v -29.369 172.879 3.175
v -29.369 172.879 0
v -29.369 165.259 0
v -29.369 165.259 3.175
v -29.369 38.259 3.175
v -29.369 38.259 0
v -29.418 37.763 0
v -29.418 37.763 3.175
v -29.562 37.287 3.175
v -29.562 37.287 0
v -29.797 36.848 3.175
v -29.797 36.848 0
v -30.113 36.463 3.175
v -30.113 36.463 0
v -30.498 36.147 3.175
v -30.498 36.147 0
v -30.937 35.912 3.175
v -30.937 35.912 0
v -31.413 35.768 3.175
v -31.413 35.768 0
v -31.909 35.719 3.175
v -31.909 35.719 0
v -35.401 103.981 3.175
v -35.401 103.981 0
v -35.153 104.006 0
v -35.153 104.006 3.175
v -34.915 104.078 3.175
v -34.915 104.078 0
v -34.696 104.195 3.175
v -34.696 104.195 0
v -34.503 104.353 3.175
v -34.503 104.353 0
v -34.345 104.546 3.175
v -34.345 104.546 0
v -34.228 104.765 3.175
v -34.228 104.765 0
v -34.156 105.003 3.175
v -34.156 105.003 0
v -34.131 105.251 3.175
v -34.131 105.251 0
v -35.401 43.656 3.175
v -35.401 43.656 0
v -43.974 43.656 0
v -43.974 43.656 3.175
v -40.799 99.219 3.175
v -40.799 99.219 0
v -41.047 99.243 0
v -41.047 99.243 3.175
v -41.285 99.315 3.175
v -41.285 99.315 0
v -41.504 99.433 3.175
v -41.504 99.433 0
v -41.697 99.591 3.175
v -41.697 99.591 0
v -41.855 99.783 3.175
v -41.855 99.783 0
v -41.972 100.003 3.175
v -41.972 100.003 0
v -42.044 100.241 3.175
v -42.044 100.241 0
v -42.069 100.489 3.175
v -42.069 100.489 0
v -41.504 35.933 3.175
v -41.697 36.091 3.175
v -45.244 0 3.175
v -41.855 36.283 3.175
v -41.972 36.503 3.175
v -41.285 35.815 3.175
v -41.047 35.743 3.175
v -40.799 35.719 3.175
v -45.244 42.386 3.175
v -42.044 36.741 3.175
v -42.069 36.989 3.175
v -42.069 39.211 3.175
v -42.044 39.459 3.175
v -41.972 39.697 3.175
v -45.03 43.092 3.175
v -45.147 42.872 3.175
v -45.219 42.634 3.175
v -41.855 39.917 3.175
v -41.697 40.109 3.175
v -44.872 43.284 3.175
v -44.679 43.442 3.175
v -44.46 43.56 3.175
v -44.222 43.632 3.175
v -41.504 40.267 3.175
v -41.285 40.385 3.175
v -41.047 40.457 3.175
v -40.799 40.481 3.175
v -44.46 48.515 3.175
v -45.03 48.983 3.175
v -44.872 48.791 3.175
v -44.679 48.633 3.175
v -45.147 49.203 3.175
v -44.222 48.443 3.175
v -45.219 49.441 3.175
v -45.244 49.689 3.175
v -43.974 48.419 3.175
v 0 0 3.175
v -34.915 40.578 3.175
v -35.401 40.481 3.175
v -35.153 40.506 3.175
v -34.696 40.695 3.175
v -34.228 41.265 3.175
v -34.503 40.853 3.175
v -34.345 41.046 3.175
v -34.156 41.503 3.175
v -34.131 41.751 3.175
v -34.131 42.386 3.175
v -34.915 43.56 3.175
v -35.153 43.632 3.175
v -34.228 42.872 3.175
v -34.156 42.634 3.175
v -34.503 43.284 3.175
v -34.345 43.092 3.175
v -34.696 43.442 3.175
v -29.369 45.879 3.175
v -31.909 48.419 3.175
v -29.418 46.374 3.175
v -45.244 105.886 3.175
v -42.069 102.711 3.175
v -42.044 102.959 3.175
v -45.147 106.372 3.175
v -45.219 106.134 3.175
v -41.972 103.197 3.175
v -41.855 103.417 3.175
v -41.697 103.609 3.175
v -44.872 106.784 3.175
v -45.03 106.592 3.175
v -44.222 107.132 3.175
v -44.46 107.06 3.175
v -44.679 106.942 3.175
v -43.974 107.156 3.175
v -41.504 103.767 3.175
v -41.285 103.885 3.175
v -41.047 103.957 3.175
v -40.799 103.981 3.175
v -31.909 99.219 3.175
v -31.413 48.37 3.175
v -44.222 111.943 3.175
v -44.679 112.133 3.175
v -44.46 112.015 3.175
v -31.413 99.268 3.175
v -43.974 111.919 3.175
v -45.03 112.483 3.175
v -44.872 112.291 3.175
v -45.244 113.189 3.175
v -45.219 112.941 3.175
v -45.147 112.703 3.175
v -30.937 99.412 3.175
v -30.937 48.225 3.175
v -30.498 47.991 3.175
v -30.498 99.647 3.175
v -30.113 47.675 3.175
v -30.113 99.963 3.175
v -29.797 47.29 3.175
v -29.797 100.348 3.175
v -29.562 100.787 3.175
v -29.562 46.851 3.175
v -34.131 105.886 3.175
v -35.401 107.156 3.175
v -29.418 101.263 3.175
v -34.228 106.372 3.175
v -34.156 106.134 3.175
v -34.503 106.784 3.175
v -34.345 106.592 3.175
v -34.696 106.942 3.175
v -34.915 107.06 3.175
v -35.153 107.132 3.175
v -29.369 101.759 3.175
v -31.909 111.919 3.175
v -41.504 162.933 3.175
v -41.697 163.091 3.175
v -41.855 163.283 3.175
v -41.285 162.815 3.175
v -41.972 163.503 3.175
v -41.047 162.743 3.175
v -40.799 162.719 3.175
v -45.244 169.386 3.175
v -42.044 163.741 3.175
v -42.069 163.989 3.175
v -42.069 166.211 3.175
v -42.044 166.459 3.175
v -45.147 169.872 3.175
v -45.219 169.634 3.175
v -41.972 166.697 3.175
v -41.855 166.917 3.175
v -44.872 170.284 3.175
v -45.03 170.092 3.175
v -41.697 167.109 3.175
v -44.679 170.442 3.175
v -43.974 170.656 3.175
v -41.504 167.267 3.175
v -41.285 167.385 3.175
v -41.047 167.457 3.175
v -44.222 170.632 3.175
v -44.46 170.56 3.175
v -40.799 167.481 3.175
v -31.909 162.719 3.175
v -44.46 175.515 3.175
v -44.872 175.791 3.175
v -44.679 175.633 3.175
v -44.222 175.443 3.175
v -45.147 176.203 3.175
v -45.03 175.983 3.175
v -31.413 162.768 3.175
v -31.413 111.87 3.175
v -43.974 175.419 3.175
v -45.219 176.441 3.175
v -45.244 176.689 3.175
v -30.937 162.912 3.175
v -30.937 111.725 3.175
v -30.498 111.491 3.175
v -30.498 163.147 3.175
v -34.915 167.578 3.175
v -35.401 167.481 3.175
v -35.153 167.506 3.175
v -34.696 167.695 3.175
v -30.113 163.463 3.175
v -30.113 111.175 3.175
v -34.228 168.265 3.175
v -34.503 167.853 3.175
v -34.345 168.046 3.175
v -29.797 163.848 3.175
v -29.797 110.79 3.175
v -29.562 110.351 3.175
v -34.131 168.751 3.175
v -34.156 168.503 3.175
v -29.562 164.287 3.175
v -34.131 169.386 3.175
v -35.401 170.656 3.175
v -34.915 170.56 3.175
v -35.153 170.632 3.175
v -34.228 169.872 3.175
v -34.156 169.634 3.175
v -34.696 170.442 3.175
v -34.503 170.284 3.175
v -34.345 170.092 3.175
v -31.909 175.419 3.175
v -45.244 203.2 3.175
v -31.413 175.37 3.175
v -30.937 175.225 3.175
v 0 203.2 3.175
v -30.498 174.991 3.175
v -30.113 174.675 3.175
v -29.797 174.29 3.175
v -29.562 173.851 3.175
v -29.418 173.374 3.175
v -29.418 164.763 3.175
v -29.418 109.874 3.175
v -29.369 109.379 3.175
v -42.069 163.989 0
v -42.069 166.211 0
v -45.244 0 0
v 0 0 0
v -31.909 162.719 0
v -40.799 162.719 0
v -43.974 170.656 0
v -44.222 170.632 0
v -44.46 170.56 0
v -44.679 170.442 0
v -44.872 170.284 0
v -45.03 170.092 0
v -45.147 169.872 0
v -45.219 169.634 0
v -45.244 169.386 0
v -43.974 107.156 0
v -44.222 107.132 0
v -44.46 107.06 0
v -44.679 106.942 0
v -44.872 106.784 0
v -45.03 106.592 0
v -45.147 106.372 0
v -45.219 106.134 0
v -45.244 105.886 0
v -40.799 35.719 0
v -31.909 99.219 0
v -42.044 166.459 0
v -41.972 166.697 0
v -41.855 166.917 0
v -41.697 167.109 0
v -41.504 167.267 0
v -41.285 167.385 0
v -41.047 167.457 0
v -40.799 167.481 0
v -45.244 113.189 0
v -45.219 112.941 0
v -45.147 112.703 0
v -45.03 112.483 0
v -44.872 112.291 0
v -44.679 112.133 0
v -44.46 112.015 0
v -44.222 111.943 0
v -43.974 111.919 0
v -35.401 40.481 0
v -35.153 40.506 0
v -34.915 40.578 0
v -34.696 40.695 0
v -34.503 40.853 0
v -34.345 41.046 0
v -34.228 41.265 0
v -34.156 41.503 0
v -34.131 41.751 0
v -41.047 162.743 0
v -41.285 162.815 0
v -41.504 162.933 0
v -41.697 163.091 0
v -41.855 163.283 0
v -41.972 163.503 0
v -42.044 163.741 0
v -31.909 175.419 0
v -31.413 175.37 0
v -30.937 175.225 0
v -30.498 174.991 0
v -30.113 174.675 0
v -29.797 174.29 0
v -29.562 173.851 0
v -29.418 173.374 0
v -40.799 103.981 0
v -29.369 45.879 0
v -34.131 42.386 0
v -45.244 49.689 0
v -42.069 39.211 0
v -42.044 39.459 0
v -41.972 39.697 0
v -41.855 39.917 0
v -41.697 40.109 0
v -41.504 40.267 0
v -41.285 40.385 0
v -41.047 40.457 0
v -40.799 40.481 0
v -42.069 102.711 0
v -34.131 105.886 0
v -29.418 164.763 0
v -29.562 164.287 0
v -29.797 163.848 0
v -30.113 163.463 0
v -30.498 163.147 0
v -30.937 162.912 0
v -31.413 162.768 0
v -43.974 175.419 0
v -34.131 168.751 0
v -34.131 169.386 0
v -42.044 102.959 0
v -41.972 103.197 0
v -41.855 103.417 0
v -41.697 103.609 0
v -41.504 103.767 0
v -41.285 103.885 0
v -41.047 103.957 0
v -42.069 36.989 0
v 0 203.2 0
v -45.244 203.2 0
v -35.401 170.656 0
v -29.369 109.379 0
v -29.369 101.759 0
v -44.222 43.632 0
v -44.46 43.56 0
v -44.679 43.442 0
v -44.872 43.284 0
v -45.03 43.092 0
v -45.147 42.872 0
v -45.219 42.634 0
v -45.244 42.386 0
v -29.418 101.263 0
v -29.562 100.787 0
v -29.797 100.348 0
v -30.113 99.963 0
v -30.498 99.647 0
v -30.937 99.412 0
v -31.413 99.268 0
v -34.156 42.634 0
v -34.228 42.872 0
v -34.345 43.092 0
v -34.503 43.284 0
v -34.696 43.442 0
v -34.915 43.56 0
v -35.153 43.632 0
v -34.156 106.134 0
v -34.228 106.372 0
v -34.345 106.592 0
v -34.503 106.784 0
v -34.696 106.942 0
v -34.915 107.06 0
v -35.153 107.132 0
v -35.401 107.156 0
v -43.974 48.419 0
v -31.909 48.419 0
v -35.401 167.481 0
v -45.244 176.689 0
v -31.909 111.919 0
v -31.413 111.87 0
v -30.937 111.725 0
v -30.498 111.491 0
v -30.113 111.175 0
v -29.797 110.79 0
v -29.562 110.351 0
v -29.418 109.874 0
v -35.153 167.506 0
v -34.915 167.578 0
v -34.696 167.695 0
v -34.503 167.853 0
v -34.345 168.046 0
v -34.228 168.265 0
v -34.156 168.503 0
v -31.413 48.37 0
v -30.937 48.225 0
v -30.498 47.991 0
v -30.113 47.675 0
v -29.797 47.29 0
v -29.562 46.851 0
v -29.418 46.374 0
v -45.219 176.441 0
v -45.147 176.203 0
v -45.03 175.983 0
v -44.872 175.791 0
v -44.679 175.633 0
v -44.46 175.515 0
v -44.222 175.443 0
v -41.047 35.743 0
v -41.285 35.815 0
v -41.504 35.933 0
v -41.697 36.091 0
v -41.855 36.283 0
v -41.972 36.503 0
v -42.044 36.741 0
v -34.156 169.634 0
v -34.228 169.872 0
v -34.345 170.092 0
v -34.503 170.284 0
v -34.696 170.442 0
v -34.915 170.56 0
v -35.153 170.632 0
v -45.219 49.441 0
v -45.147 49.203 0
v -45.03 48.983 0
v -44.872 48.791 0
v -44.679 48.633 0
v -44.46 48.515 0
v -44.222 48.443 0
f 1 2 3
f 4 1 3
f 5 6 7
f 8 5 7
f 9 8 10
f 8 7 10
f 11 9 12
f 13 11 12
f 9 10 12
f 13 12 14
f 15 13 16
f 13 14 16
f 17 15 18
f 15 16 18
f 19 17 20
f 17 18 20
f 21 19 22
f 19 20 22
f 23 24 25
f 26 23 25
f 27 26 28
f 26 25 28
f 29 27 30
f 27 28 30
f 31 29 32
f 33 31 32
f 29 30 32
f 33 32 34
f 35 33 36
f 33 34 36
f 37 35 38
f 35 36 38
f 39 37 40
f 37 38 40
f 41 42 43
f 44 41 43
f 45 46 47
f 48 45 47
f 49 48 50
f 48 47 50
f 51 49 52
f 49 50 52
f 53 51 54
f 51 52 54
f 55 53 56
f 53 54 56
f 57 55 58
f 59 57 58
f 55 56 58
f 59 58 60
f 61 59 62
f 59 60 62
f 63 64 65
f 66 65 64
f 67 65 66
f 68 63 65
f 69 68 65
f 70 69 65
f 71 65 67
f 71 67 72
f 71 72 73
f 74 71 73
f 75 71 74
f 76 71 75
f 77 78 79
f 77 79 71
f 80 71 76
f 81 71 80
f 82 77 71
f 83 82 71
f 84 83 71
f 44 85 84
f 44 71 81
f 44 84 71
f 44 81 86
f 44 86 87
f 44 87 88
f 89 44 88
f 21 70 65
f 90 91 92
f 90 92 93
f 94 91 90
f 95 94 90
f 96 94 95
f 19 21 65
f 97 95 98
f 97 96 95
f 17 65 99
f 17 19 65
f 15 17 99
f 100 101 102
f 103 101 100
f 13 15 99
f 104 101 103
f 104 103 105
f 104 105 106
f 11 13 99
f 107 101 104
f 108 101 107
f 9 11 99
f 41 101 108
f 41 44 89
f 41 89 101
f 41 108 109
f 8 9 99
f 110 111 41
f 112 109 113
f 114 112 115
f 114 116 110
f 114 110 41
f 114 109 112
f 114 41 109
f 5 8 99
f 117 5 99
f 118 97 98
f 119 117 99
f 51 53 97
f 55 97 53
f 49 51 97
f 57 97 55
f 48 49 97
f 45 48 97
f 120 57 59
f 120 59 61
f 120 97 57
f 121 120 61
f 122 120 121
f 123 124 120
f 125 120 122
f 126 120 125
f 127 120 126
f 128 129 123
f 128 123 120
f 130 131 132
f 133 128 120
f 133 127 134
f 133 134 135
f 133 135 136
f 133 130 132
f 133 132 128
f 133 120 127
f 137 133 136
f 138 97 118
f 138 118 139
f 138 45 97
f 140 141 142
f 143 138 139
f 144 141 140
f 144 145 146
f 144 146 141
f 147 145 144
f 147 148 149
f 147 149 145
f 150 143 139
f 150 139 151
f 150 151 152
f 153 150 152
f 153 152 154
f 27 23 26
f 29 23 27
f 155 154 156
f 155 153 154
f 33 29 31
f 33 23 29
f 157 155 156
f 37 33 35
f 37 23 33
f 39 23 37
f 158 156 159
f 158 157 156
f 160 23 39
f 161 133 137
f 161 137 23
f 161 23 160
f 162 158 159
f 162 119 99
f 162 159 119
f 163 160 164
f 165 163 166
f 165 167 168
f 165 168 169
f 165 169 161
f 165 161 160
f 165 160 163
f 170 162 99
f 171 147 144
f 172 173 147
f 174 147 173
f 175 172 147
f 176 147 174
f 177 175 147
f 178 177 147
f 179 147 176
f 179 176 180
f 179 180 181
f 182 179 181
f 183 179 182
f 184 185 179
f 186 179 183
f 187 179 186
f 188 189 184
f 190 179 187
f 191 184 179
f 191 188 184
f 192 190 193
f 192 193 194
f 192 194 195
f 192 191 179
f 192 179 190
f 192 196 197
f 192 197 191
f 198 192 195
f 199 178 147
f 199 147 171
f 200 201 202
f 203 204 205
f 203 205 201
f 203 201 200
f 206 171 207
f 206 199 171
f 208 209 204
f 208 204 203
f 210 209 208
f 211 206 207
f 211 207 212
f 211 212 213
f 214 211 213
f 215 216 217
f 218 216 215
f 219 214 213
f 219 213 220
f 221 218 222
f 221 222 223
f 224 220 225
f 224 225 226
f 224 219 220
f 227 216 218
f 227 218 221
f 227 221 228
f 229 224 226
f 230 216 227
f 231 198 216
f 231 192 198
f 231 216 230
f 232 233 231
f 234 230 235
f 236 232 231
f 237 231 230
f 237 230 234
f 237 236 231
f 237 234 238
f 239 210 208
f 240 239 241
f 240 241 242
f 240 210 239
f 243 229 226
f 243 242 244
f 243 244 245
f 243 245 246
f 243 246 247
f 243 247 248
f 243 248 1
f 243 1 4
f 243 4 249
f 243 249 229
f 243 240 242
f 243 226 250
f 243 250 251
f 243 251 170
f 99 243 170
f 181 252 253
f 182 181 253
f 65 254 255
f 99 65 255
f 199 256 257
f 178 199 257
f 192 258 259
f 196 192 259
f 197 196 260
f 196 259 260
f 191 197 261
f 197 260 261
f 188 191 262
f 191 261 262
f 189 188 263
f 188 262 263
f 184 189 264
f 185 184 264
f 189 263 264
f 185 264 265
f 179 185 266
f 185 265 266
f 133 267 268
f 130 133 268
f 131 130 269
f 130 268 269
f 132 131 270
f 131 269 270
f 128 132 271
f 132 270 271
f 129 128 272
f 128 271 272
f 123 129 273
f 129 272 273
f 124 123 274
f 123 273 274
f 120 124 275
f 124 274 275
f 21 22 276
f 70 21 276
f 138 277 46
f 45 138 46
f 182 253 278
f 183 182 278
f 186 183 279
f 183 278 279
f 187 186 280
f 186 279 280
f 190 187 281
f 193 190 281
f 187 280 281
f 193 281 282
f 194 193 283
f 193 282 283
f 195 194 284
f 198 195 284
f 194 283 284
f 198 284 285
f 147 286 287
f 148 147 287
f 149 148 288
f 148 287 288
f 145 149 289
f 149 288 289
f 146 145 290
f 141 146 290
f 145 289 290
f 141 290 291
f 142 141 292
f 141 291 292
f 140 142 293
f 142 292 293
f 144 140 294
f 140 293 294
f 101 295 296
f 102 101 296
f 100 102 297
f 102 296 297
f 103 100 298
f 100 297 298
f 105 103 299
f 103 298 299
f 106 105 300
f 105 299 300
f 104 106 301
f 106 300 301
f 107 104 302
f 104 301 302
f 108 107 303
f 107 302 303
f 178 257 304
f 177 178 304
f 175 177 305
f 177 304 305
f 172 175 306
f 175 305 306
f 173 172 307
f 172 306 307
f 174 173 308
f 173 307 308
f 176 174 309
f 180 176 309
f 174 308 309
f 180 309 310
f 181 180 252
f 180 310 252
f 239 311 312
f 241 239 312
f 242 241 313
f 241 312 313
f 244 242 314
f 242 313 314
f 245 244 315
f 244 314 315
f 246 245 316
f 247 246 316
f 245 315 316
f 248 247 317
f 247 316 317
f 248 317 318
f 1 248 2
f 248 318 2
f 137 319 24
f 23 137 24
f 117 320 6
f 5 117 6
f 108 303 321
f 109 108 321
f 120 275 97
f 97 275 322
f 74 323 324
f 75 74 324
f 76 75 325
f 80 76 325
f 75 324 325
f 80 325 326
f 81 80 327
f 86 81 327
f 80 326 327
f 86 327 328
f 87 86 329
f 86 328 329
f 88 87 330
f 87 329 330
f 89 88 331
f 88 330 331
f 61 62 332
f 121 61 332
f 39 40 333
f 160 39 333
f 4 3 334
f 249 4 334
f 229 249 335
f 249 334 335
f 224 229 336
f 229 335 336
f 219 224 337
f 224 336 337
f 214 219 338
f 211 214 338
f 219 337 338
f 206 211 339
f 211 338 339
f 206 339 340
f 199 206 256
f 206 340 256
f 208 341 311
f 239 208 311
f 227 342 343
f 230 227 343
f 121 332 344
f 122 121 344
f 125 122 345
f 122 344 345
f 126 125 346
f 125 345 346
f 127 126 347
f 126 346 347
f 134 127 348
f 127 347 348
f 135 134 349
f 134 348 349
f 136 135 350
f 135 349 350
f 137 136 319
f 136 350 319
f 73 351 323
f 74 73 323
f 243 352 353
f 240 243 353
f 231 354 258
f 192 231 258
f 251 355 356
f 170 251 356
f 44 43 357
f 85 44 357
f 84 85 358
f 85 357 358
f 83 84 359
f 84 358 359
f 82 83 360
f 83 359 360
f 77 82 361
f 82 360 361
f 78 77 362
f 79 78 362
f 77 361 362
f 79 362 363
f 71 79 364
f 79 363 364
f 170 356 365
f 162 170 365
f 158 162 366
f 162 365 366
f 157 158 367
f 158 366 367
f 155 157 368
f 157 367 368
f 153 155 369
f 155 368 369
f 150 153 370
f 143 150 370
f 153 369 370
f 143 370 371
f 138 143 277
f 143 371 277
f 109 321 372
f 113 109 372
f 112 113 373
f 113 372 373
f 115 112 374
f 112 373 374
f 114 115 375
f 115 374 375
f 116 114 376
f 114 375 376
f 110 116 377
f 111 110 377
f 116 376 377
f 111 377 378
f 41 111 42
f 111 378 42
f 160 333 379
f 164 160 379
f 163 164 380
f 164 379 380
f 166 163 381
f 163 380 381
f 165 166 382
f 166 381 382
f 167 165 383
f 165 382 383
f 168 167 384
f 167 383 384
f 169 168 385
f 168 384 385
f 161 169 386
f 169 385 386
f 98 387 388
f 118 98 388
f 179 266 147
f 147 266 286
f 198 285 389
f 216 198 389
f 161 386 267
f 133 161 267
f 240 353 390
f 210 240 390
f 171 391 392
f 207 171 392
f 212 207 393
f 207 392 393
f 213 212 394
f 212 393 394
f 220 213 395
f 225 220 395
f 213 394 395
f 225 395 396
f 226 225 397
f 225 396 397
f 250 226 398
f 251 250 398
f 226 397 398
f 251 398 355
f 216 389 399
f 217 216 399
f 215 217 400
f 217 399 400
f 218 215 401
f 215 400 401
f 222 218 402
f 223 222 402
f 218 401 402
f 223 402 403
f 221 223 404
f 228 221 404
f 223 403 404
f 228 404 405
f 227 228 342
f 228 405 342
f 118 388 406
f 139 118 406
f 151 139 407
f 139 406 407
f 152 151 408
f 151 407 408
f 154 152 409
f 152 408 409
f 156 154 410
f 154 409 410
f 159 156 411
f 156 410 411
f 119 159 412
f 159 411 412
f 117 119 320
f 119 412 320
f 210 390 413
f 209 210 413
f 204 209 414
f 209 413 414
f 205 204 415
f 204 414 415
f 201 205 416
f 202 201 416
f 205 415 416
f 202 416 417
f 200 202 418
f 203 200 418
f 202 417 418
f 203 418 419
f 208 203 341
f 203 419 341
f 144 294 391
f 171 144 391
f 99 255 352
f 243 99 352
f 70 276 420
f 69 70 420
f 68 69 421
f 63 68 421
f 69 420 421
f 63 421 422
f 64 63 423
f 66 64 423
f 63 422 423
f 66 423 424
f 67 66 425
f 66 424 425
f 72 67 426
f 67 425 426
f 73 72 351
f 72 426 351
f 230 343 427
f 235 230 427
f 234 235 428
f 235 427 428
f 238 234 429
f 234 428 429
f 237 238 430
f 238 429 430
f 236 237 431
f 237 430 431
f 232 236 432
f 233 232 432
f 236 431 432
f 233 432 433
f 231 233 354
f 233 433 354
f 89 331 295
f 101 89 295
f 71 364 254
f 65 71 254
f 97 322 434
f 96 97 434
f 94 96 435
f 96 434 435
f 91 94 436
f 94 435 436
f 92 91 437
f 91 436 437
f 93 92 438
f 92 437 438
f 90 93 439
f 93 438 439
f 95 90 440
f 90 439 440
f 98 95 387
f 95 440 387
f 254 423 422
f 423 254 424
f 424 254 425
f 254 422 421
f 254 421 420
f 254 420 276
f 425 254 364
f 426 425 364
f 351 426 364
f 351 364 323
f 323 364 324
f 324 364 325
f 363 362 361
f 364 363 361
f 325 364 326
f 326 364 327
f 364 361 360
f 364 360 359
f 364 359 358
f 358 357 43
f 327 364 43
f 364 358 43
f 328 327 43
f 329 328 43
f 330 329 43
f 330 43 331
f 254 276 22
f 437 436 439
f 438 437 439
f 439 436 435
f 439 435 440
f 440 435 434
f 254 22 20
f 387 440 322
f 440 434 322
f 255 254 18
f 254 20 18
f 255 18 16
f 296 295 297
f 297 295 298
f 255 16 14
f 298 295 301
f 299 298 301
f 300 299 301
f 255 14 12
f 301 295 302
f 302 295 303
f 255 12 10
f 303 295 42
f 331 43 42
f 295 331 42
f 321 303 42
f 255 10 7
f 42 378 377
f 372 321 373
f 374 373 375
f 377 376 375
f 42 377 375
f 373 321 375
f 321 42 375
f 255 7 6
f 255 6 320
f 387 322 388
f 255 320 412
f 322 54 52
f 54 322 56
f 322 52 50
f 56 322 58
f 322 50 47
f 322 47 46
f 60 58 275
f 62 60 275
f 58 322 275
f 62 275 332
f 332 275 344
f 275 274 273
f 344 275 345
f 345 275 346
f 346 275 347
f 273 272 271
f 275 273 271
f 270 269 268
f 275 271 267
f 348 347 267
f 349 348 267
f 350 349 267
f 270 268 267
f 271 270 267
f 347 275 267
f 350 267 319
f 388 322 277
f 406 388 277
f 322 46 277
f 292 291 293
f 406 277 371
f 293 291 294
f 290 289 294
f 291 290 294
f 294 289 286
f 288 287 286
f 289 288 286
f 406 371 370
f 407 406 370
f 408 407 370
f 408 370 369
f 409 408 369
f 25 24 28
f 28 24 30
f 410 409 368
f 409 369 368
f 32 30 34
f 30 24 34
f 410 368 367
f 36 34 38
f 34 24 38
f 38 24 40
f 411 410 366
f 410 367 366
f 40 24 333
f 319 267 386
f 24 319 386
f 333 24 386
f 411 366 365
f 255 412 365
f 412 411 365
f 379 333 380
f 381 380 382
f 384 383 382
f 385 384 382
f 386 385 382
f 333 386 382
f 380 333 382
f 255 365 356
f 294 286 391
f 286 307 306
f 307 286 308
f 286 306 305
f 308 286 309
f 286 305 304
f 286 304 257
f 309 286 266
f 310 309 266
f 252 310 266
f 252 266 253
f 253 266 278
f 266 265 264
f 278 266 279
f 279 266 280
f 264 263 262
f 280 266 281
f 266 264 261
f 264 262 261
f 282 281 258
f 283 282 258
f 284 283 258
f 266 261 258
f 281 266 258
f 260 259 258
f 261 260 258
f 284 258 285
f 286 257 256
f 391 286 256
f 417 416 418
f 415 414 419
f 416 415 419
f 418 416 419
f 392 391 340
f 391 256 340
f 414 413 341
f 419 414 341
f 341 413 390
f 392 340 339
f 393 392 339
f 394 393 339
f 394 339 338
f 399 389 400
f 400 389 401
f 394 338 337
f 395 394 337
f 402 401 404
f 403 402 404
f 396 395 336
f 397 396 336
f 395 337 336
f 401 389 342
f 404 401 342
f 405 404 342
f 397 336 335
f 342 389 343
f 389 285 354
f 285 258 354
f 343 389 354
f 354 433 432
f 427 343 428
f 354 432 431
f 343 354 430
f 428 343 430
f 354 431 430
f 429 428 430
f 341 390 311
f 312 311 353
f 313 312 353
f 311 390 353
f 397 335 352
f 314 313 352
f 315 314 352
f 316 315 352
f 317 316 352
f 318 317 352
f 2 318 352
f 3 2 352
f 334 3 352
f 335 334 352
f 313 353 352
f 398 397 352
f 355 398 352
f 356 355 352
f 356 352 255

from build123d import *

# Parameters (mm, degrees)
F1_DEPTH = 3.175


# Not quite as in the source:
# - a length typed as a fraction of an inch, garbled in the dataset ("3 / 203.2 mm" for 3/8 in), is restored


with BuildPart() as f1:
    # F0 (on Top) → F1 (new body)
    with BuildSketch(Plane.XY):
        with BuildLine():
            Line((0, 0), (0, 203.2))
            Line((0, 203.2), (-45.24375, 203.2))
            Line((-45.24375, 203.2), (-45.24375, 176.68875))
            ThreePointArc((-45.24375, 176.68875), (-44.8717756121, 175.7907243879), (-43.97375, 175.41875))
            Line((-43.97375, 175.41875), (-31.90875, 175.41875))
            ThreePointArc((-31.90875, 175.41875), (-30.1126987758, 174.6748012242), (-29.36875, 172.87875))
            Line((-29.36875, 172.87875), (-29.36875, 165.25875))
            ThreePointArc((-29.36875, 165.25875), (-30.1126987758, 163.4626987758), (-31.90875, 162.71875))
            Line((-31.90875, 162.71875), (-40.79875, 162.71875))
            ThreePointArc((-40.79875, 162.71875), (-41.6967756121, 163.0907243879), (-42.06875, 163.98875))
            Line((-42.06875, 163.98875), (-42.06875, 166.21125))
            ThreePointArc((-42.06875, 166.21125), (-41.6967756121, 167.1092756121), (-40.79875, 167.48125))
            Line((-40.79875, 167.48125), (-35.40125, 167.48125))
            ThreePointArc((-35.40125, 167.48125), (-34.5032243879, 167.8532243879), (-34.13125, 168.75125))
            Line((-34.13125, 168.75125), (-34.13125, 169.38625))
            ThreePointArc((-34.13125, 169.38625), (-34.5032243879, 170.2842756121), (-35.40125, 170.65625))
            Line((-35.40125, 170.65625), (-43.97375, 170.65625))
            ThreePointArc((-43.97375, 170.65625), (-44.8717756121, 170.2842756121), (-45.24375, 169.38625))
            Line((-45.24375, 169.38625), (-45.24375, 113.18875))
            ThreePointArc((-45.24375, 113.18875), (-44.8717756121, 112.2907243879), (-43.97375, 111.91875))
            Line((-43.97375, 111.91875), (-31.90875, 111.91875))
            ThreePointArc((-31.90875, 111.91875), (-30.1126987758, 111.1748012242), (-29.36875, 109.37875))
            Line((-29.36875, 109.37875), (-29.36875, 101.75875))
            ThreePointArc((-29.36875, 101.75875), (-30.1126987758, 99.9626987758), (-31.90875, 99.21875))
            Line((-31.90875, 99.21875), (-40.79875, 99.21875))
            ThreePointArc((-40.79875, 99.21875), (-41.6967756121, 99.5907243879), (-42.06875, 100.48875))
            Line((-42.06875, 100.48875), (-42.06875, 102.71125))
            ThreePointArc((-42.06875, 102.71125), (-41.6967756121, 103.6092756121), (-40.79875, 103.98125))
            Line((-40.79875, 103.98125), (-35.40125, 103.98125))
            ThreePointArc((-35.40125, 103.98125), (-34.5032243879, 104.3532243879), (-34.13125, 105.25125))
            Line((-34.13125, 105.25125), (-34.13125, 105.88625))
            ThreePointArc((-34.13125, 105.88625), (-34.5032243879, 106.7842756121), (-35.40125, 107.15625))
            Line((-35.40125, 107.15625), (-43.97375, 107.15625))
            ThreePointArc((-43.97375, 107.15625), (-44.8717756121, 106.7842756121), (-45.24375, 105.88625))
            Line((-45.24375, 105.88625), (-45.24375, 49.68875))
            ThreePointArc((-45.24375, 49.68875), (-44.8717756121, 48.7907243879), (-43.97375, 48.41875))
            Line((-43.97375, 48.41875), (-31.90875, 48.41875))
            ThreePointArc((-31.90875, 48.41875), (-30.1126987758, 47.6748012242), (-29.36875, 45.87875))
            Line((-29.36875, 45.87875), (-29.36875, 38.25875))
            ThreePointArc((-29.36875, 38.25875), (-30.1126987758, 36.4626987758), (-31.90875, 35.71875))
            Line((-31.90875, 35.71875), (-40.79875, 35.71875))
            ThreePointArc((-40.79875, 35.71875), (-41.6967756121, 36.0907243879), (-42.06875, 36.98875))
            Line((-42.06875, 36.98875), (-42.06875, 39.21125))
            ThreePointArc((-42.06875, 39.21125), (-41.6967756121, 40.1092756121), (-40.79875, 40.48125))
            Line((-40.79875, 40.48125), (-35.40125, 40.48125))
            ThreePointArc((-35.40125, 40.48125), (-34.5032243879, 40.8532243879), (-34.13125, 41.75125))
            Line((-34.13125, 41.75125), (-34.13125, 42.38625))
            ThreePointArc((-34.13125, 42.38625), (-34.5032243879, 43.2842756121), (-35.40125, 43.65625))
            Line((-35.40125, 43.65625), (-43.97375, 43.65625))
            ThreePointArc((-43.97375, 43.65625), (-44.8717756121, 43.2842756121), (-45.24375, 42.38625))
            Line((-45.24375, 42.38625), (-45.24375, 0))
            Line((-45.24375, 0), (0, 0))
        make_face()
    extrude(amount=F1_DEPTH)


solid = f1.part
